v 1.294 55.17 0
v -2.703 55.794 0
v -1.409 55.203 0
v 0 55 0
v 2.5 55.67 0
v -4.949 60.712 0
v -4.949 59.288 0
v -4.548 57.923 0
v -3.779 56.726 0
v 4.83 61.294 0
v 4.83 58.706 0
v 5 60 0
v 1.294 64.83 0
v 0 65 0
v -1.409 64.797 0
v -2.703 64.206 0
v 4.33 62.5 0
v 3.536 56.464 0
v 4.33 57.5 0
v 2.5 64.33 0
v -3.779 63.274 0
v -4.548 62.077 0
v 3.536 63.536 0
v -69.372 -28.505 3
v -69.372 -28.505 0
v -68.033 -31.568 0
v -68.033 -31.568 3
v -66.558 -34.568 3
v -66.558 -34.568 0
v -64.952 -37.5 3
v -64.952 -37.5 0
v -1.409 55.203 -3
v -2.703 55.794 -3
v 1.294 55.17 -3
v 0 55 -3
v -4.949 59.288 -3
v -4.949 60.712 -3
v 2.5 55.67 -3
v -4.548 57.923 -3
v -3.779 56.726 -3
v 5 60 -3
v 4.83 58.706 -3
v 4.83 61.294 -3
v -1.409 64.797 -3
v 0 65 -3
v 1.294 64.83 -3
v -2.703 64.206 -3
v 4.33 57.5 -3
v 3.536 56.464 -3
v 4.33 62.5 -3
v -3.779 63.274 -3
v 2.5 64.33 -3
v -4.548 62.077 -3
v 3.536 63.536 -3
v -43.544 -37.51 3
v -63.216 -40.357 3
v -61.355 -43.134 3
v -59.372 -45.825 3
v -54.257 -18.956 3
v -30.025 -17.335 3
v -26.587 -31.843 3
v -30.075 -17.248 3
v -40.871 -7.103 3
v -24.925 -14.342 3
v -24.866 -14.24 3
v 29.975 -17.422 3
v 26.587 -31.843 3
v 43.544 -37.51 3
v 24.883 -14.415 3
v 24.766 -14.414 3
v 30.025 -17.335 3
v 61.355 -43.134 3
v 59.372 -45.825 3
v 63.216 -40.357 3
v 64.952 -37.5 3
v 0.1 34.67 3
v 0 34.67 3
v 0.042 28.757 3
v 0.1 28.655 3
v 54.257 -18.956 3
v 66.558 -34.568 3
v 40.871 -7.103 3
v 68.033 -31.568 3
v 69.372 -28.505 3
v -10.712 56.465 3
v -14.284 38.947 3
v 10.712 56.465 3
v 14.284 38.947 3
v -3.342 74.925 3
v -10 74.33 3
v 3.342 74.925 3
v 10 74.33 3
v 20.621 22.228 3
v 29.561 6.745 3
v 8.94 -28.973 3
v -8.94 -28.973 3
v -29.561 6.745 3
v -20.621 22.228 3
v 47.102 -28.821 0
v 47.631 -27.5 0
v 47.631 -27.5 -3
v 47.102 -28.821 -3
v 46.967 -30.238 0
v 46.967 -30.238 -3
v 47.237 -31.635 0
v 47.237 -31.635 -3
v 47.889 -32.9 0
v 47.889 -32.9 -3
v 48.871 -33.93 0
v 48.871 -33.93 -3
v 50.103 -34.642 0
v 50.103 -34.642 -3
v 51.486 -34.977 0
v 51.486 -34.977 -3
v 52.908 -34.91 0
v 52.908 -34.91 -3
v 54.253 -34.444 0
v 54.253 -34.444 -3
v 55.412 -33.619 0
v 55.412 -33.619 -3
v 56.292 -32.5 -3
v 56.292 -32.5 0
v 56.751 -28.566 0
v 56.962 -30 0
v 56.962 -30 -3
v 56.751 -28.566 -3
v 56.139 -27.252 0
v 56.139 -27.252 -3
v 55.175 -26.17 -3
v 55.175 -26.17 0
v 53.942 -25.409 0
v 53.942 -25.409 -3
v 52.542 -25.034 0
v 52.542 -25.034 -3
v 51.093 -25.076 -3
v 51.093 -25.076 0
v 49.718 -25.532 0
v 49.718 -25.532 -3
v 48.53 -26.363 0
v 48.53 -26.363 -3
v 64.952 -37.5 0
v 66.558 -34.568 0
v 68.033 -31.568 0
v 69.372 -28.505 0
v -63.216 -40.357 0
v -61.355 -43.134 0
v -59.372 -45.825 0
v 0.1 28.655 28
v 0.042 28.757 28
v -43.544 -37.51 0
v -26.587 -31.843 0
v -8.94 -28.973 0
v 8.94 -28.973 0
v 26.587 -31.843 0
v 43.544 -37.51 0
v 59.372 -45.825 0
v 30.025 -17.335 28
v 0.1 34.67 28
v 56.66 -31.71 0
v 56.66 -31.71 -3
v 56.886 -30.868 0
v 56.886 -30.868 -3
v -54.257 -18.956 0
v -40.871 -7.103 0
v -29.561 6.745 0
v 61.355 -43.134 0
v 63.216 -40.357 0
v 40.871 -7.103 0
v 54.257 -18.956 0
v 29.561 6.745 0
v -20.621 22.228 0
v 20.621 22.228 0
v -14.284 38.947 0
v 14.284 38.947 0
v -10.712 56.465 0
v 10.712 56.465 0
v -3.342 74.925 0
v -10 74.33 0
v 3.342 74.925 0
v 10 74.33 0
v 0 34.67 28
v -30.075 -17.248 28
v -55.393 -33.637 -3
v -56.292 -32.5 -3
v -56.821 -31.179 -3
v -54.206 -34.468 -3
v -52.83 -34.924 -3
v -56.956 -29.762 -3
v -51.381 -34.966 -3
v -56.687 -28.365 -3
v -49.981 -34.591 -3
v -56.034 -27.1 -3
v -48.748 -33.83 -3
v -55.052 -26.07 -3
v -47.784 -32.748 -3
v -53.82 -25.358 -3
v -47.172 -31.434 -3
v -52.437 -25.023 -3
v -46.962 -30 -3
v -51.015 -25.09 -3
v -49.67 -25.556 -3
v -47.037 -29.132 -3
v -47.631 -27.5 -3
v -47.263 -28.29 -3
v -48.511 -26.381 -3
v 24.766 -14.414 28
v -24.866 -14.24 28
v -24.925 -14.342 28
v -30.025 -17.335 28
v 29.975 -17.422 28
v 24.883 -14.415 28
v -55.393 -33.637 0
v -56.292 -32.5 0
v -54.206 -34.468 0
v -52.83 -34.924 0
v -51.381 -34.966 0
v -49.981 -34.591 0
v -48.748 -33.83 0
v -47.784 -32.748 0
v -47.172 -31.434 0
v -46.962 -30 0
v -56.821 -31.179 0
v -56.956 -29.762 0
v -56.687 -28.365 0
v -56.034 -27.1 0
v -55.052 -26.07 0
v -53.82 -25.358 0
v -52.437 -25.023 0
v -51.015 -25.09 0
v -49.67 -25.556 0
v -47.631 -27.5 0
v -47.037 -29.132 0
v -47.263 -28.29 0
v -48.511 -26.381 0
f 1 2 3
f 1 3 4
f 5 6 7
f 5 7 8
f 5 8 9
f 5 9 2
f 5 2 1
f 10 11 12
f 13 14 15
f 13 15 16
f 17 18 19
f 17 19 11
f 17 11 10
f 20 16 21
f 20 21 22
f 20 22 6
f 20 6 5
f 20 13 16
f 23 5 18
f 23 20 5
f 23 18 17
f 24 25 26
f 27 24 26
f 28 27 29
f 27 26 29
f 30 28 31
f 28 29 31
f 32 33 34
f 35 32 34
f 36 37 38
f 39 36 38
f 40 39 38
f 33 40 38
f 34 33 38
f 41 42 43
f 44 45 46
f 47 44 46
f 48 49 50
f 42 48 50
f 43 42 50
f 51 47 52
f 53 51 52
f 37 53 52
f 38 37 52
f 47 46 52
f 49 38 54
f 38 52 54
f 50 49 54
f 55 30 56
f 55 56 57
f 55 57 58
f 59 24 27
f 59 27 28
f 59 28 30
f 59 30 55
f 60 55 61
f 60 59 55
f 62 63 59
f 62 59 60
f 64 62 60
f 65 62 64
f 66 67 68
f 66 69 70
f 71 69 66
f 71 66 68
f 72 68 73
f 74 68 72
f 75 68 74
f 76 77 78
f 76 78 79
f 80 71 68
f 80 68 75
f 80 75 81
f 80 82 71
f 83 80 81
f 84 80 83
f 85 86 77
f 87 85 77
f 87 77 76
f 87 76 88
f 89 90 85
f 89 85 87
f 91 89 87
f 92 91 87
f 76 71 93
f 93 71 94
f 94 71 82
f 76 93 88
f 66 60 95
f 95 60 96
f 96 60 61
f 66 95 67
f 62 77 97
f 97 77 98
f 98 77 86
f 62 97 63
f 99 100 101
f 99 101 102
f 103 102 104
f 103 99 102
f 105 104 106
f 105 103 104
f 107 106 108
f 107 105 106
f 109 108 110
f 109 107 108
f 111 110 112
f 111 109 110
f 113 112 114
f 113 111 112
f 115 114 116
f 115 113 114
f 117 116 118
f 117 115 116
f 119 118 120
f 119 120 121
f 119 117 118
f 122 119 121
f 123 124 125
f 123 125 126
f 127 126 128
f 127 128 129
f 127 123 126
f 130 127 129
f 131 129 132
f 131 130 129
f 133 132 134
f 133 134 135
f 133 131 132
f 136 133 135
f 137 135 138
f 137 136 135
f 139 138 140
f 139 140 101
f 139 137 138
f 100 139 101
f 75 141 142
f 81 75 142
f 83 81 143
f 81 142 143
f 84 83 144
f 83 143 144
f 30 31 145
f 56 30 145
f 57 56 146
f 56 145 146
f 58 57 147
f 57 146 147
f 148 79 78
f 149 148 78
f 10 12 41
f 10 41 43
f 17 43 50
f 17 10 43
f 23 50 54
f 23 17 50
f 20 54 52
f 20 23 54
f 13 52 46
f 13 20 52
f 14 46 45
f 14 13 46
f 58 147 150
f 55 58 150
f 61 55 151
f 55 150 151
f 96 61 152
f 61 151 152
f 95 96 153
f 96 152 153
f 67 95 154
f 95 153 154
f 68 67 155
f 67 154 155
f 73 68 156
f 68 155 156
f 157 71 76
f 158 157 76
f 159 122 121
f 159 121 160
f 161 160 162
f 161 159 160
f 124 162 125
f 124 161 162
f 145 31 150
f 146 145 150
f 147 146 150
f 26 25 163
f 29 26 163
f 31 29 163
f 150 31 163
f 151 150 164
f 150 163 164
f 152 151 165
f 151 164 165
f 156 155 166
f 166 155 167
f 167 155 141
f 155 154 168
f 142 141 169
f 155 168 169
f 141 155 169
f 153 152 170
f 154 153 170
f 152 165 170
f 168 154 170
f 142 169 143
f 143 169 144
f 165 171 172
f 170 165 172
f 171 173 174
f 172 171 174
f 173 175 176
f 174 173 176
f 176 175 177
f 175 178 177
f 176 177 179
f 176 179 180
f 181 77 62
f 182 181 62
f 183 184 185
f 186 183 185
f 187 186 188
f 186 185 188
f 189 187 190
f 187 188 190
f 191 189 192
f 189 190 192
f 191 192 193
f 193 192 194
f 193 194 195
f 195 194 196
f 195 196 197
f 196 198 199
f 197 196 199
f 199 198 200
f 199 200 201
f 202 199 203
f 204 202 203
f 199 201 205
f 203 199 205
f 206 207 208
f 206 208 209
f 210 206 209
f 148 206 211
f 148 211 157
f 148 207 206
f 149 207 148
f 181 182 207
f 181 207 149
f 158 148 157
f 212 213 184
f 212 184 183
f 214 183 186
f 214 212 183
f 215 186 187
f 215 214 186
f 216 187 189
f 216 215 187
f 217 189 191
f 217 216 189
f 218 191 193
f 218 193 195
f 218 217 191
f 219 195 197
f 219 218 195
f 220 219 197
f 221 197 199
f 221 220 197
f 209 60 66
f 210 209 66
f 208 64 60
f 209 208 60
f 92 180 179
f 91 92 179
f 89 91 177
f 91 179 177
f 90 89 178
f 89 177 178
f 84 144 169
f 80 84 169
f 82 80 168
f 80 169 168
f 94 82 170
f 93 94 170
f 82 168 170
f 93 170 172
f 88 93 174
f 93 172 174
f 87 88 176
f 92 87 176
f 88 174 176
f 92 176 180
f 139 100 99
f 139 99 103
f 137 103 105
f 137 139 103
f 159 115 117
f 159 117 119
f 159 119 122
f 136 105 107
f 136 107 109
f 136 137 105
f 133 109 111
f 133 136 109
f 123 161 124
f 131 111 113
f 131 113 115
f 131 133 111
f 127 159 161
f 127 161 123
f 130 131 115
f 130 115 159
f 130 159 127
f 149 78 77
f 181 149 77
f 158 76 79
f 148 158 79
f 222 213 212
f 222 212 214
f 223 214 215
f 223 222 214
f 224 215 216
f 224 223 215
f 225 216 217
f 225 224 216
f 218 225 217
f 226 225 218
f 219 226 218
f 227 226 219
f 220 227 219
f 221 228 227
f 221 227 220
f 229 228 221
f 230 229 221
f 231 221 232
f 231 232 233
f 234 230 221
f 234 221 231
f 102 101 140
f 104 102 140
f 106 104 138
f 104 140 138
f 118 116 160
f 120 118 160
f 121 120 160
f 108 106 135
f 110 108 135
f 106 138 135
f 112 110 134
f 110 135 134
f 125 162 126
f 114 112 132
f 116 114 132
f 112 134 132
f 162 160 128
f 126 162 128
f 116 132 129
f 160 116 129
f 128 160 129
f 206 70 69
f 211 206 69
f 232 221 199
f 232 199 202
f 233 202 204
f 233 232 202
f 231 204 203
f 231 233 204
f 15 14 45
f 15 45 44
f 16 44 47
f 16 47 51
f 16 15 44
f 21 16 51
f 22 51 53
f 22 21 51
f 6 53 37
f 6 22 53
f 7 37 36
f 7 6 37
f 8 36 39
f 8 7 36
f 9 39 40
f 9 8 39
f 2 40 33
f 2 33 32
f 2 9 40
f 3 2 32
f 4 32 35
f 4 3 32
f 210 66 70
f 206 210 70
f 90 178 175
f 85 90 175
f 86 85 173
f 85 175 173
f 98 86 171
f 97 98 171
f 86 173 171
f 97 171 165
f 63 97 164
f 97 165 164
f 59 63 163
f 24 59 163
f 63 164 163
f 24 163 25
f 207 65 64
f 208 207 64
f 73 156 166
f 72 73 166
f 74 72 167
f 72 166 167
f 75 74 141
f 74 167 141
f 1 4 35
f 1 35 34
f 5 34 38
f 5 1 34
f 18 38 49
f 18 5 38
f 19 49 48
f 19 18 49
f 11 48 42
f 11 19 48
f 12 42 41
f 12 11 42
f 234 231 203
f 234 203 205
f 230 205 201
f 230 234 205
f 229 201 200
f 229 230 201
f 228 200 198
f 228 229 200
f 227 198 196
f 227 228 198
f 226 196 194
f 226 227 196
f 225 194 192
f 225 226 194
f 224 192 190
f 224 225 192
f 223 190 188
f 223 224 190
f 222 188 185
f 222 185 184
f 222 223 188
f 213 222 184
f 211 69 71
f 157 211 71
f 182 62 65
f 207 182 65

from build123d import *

# Parameters (mm, degrees)
F1_DEPTH = 3
F2_DEPTH = 3
F4_DEPTH = 25


with BuildPart() as f1:
    # F0 (on Top) → F1 (new body)
    with BuildSketch(Plane.XY):
        with BuildLine():
            ThreePointArc((-46.9615242271, -30), (-47.1318950956, -28.7059047745), (-47.6313972081, -27.5))
            Line((-47.6313972081, -27.5), (-56.291651246, -32.5))
            ThreePointArc((-56.291651246, -32.5), (-50.6674290016, -34.8296291314), (-46.9615242271, -30))
        make_face()
        with BuildLine():
            Line((-56.291651246, -32.5), (-47.6313972081, -27.5))
            ThreePointArc((-47.6313972081, -27.5), (-54.4615242271, -25.6698729811), (-56.291651246, -32.5))
        make_face()
    extrude(amount=-F1_DEPTH)


with BuildPart() as f1b:
    # F0 (on Top) → F1, piece 2 (new body)
    with BuildSketch(Plane.XY):
        with BuildLine():
            Line((56.291651246, -32.5), (47.6313972081, -27.5))
            ThreePointArc((47.6313972081, -27.5), (49.4615242271, -34.3301270189), (56.291651246, -32.5))
        make_face()
        with BuildLine():
            ThreePointArc((56.9615242271, -30), (53.2556194526, -25.1703708686), (47.6313972081, -27.5))
            Line((47.6313972081, -27.5), (56.291651246, -32.5))
            ThreePointArc((56.291651246, -32.5), (56.7911533585, -31.2940952255), (56.9615242271, -30))
        make_face()
    extrude(amount=-F1_DEPTH)


with BuildPart() as f1c:
    # F0 (on Top) → F1, piece 3 (new body)
    with BuildSketch(Plane.XY):
        with BuildLine():
            ThreePointArc((0, 65), (-5, 60), (0, 55))
            Line((0, 55), (0, 65))
        make_face()
        with BuildLine():
            Line((0, 65), (0, 55))
            ThreePointArc((0, 55), (3.5355339059, 56.4644660941), (5, 60))
            ThreePointArc((5, 60), (3.5355339059, 63.5355339059), (0, 65))
        make_face()
    extrude(amount=-F1_DEPTH)


with BuildPart() as f2:
    # F0 (on Top) → F2 (new body)
    with BuildSketch(Plane.XY):
        with BuildLine():
            Line((-56.291651246, -32.5), (-47.6313972081, -27.5))
            ThreePointArc((-47.6313972081, -27.5), (-54.4615242271, -25.6698729811), (-56.291651246, -32.5))
        make_face()
        with BuildLine():
            ThreePointArc((-46.9615242271, -30), (-47.1318950956, -28.7059047745), (-47.6313972081, -27.5))
            Line((-47.6313972081, -27.5), (-56.291651246, -32.5))
            ThreePointArc((-56.291651246, -32.5), (-50.6674290016, -34.8296291314), (-46.9615242271, -30))
        make_face()
        with BuildLine():
            Line((0, 65), (0, 55))
            ThreePointArc((0, 55), (3.5355339059, 56.4644660941), (5, 60))
            ThreePointArc((5, 60), (3.5355339059, 63.5355339059), (0, 65))
        make_face()
        with BuildLine():
            ThreePointArc((0, 65), (-5, 60), (0, 55))
            Line((0, 55), (0, 65))
        make_face()
        with BuildLine():
            ThreePointArc((56.9615242271, -30), (53.2556194526, -25.1703708686), (47.6313972081, -27.5))
            Line((47.6313972081, -27.5), (56.291651246, -32.5))
            ThreePointArc((56.291651246, -32.5), (56.7911533585, -31.2940952255), (56.9615242271, -30))
        make_face()
        with BuildLine():
            Line((56.291651246, -32.5), (47.6313972081, -27.5))
            ThreePointArc((47.6313972081, -27.5), (49.4615242271, -34.3301270189), (56.291651246, -32.5))
        make_face()
        with BuildLine():
            Line((47.6313972081, -27.5), (0, 0))
            Line((0, 0), (-47.6313972081, -27.5))
            ThreePointArc((-47.6313972081, -27.5), (-47.1318950956, -28.7059047745), (-46.9615242271, -30))
            ThreePointArc((-46.9615242271, -30), (-50.6674290016, -34.8296291314), (-56.291651246, -32.5))
            Line((-56.291651246, -32.5), (-64.9519052838, -37.5))
            ThreePointArc((-64.9519052838, -37.5), (-62.3011590473, -41.7560244918), (-59.3719659479, -45.8254259061))
            ThreePointArc((-59.3719659479, -45.8254259061), (0, -28.6122568553), (59.3719659479, -45.8254259061))
            ThreePointArc((59.3719659479, -45.8254259061), (62.3011590473, -41.7560244918), (64.9519052838, -37.5))
            Line((64.9519052838, -37.5), (56.291651246, -32.5))
            ThreePointArc((56.291651246, -32.5), (49.4615242271, -34.3301270189), (47.6313972081, -27.5))
        make_face()
        with BuildLine():
            Line((0, 55), (0, 0))
            Line((0, 0), (47.6313972081, -27.5))
            ThreePointArc((47.6313972081, -27.5), (53.2556194526, -25.1703708686), (56.9615242271, -30))
            ThreePointArc((56.9615242271, -30), (56.7911533585, -31.2940952255), (56.291651246, -32.5))
            Line((56.291651246, -32.5), (64.9519052838, -37.5))
            ThreePointArc((64.9519052838, -37.5), (67.3123574946, -33.0763741743), (69.3719659479, -28.5049178305))
            ThreePointArc((69.3719659479, -28.5049178305), (24.7789412963, 14.3061284276), (10, 74.3303437366))
            ThreePointArc((10, 74.3303437366), (5.0111984473, 74.8323986661), (0, 75))
            Line((0, 75), (0, 65))
            ThreePointArc((0, 65), (3.5355339059, 63.5355339059), (5, 60))
            ThreePointArc((5, 60), (3.5355339059, 56.4644660941), (0, 55))
        make_face()
        with BuildLine():
            Line((-47.6313972081, -27.5), (0, 0))
            Line((0, 0), (0, 55))
            ThreePointArc((0, 55), (-5, 60), (0, 65))
            Line((0, 65), (0, 75))
            ThreePointArc((0, 75), (-5.0111984473, 74.8323986661), (-10, 74.3303437366))
            ThreePointArc((-10, 74.3303437366), (-24.7789412963, 14.3061284276), (-69.3719659479, -28.5049178305))
            ThreePointArc((-69.3719659479, -28.5049178305), (-67.3123574946, -33.0763741743), (-64.9519052838, -37.5))
            Line((-64.9519052838, -37.5), (-56.291651246, -32.5))
            ThreePointArc((-56.291651246, -32.5), (-54.4615242271, -25.6698729811), (-47.6313972081, -27.5))
        make_face()
    extrude(amount=F2_DEPTH)

    # F3 (on face) → F4 (join)
    with BuildSketch(Plane.XY.offset(3)):
        Polygon((0.0416322801, 28.7569014453), (0, 34.6700313418), (-30.0751948323, -17.2480065237), (-24.8659746101, -14.2404618261), (0, 28.6850327074), align=None)
        Polygon((0.100385602, 28.6547966152), (0.0416322801, 28.7569014453), (0, 28.6850327074), (-24.8659746101, -14.2404618261), (-24.9250233258, -14.3423961105), (-24.841967033, -14.3425163537), (24.7655890081, -14.4143347891), (24.8833910457, -14.4145053349), (24.841967033, -14.3425163537), align=None)
        Polygon((0.100385602, 34.6698860104), (0.100385602, 28.6547966152), (24.841967033, -14.3425163537), (24.8833910457, -14.4145053349), (30.025127892, -17.3350156709), align=None)
        Polygon((-24.841967033, -14.3425163537), (-24.9250233258, -14.3423961105), (-30.025127892, -17.3350156709), (29.9748092303, -17.4218794867), (24.7655890081, -14.4143347891), align=None)
    extrude(amount=F4_DEPTH)


solid = Compound([f1.part, f1b.part, f1c.part, f2.part])
